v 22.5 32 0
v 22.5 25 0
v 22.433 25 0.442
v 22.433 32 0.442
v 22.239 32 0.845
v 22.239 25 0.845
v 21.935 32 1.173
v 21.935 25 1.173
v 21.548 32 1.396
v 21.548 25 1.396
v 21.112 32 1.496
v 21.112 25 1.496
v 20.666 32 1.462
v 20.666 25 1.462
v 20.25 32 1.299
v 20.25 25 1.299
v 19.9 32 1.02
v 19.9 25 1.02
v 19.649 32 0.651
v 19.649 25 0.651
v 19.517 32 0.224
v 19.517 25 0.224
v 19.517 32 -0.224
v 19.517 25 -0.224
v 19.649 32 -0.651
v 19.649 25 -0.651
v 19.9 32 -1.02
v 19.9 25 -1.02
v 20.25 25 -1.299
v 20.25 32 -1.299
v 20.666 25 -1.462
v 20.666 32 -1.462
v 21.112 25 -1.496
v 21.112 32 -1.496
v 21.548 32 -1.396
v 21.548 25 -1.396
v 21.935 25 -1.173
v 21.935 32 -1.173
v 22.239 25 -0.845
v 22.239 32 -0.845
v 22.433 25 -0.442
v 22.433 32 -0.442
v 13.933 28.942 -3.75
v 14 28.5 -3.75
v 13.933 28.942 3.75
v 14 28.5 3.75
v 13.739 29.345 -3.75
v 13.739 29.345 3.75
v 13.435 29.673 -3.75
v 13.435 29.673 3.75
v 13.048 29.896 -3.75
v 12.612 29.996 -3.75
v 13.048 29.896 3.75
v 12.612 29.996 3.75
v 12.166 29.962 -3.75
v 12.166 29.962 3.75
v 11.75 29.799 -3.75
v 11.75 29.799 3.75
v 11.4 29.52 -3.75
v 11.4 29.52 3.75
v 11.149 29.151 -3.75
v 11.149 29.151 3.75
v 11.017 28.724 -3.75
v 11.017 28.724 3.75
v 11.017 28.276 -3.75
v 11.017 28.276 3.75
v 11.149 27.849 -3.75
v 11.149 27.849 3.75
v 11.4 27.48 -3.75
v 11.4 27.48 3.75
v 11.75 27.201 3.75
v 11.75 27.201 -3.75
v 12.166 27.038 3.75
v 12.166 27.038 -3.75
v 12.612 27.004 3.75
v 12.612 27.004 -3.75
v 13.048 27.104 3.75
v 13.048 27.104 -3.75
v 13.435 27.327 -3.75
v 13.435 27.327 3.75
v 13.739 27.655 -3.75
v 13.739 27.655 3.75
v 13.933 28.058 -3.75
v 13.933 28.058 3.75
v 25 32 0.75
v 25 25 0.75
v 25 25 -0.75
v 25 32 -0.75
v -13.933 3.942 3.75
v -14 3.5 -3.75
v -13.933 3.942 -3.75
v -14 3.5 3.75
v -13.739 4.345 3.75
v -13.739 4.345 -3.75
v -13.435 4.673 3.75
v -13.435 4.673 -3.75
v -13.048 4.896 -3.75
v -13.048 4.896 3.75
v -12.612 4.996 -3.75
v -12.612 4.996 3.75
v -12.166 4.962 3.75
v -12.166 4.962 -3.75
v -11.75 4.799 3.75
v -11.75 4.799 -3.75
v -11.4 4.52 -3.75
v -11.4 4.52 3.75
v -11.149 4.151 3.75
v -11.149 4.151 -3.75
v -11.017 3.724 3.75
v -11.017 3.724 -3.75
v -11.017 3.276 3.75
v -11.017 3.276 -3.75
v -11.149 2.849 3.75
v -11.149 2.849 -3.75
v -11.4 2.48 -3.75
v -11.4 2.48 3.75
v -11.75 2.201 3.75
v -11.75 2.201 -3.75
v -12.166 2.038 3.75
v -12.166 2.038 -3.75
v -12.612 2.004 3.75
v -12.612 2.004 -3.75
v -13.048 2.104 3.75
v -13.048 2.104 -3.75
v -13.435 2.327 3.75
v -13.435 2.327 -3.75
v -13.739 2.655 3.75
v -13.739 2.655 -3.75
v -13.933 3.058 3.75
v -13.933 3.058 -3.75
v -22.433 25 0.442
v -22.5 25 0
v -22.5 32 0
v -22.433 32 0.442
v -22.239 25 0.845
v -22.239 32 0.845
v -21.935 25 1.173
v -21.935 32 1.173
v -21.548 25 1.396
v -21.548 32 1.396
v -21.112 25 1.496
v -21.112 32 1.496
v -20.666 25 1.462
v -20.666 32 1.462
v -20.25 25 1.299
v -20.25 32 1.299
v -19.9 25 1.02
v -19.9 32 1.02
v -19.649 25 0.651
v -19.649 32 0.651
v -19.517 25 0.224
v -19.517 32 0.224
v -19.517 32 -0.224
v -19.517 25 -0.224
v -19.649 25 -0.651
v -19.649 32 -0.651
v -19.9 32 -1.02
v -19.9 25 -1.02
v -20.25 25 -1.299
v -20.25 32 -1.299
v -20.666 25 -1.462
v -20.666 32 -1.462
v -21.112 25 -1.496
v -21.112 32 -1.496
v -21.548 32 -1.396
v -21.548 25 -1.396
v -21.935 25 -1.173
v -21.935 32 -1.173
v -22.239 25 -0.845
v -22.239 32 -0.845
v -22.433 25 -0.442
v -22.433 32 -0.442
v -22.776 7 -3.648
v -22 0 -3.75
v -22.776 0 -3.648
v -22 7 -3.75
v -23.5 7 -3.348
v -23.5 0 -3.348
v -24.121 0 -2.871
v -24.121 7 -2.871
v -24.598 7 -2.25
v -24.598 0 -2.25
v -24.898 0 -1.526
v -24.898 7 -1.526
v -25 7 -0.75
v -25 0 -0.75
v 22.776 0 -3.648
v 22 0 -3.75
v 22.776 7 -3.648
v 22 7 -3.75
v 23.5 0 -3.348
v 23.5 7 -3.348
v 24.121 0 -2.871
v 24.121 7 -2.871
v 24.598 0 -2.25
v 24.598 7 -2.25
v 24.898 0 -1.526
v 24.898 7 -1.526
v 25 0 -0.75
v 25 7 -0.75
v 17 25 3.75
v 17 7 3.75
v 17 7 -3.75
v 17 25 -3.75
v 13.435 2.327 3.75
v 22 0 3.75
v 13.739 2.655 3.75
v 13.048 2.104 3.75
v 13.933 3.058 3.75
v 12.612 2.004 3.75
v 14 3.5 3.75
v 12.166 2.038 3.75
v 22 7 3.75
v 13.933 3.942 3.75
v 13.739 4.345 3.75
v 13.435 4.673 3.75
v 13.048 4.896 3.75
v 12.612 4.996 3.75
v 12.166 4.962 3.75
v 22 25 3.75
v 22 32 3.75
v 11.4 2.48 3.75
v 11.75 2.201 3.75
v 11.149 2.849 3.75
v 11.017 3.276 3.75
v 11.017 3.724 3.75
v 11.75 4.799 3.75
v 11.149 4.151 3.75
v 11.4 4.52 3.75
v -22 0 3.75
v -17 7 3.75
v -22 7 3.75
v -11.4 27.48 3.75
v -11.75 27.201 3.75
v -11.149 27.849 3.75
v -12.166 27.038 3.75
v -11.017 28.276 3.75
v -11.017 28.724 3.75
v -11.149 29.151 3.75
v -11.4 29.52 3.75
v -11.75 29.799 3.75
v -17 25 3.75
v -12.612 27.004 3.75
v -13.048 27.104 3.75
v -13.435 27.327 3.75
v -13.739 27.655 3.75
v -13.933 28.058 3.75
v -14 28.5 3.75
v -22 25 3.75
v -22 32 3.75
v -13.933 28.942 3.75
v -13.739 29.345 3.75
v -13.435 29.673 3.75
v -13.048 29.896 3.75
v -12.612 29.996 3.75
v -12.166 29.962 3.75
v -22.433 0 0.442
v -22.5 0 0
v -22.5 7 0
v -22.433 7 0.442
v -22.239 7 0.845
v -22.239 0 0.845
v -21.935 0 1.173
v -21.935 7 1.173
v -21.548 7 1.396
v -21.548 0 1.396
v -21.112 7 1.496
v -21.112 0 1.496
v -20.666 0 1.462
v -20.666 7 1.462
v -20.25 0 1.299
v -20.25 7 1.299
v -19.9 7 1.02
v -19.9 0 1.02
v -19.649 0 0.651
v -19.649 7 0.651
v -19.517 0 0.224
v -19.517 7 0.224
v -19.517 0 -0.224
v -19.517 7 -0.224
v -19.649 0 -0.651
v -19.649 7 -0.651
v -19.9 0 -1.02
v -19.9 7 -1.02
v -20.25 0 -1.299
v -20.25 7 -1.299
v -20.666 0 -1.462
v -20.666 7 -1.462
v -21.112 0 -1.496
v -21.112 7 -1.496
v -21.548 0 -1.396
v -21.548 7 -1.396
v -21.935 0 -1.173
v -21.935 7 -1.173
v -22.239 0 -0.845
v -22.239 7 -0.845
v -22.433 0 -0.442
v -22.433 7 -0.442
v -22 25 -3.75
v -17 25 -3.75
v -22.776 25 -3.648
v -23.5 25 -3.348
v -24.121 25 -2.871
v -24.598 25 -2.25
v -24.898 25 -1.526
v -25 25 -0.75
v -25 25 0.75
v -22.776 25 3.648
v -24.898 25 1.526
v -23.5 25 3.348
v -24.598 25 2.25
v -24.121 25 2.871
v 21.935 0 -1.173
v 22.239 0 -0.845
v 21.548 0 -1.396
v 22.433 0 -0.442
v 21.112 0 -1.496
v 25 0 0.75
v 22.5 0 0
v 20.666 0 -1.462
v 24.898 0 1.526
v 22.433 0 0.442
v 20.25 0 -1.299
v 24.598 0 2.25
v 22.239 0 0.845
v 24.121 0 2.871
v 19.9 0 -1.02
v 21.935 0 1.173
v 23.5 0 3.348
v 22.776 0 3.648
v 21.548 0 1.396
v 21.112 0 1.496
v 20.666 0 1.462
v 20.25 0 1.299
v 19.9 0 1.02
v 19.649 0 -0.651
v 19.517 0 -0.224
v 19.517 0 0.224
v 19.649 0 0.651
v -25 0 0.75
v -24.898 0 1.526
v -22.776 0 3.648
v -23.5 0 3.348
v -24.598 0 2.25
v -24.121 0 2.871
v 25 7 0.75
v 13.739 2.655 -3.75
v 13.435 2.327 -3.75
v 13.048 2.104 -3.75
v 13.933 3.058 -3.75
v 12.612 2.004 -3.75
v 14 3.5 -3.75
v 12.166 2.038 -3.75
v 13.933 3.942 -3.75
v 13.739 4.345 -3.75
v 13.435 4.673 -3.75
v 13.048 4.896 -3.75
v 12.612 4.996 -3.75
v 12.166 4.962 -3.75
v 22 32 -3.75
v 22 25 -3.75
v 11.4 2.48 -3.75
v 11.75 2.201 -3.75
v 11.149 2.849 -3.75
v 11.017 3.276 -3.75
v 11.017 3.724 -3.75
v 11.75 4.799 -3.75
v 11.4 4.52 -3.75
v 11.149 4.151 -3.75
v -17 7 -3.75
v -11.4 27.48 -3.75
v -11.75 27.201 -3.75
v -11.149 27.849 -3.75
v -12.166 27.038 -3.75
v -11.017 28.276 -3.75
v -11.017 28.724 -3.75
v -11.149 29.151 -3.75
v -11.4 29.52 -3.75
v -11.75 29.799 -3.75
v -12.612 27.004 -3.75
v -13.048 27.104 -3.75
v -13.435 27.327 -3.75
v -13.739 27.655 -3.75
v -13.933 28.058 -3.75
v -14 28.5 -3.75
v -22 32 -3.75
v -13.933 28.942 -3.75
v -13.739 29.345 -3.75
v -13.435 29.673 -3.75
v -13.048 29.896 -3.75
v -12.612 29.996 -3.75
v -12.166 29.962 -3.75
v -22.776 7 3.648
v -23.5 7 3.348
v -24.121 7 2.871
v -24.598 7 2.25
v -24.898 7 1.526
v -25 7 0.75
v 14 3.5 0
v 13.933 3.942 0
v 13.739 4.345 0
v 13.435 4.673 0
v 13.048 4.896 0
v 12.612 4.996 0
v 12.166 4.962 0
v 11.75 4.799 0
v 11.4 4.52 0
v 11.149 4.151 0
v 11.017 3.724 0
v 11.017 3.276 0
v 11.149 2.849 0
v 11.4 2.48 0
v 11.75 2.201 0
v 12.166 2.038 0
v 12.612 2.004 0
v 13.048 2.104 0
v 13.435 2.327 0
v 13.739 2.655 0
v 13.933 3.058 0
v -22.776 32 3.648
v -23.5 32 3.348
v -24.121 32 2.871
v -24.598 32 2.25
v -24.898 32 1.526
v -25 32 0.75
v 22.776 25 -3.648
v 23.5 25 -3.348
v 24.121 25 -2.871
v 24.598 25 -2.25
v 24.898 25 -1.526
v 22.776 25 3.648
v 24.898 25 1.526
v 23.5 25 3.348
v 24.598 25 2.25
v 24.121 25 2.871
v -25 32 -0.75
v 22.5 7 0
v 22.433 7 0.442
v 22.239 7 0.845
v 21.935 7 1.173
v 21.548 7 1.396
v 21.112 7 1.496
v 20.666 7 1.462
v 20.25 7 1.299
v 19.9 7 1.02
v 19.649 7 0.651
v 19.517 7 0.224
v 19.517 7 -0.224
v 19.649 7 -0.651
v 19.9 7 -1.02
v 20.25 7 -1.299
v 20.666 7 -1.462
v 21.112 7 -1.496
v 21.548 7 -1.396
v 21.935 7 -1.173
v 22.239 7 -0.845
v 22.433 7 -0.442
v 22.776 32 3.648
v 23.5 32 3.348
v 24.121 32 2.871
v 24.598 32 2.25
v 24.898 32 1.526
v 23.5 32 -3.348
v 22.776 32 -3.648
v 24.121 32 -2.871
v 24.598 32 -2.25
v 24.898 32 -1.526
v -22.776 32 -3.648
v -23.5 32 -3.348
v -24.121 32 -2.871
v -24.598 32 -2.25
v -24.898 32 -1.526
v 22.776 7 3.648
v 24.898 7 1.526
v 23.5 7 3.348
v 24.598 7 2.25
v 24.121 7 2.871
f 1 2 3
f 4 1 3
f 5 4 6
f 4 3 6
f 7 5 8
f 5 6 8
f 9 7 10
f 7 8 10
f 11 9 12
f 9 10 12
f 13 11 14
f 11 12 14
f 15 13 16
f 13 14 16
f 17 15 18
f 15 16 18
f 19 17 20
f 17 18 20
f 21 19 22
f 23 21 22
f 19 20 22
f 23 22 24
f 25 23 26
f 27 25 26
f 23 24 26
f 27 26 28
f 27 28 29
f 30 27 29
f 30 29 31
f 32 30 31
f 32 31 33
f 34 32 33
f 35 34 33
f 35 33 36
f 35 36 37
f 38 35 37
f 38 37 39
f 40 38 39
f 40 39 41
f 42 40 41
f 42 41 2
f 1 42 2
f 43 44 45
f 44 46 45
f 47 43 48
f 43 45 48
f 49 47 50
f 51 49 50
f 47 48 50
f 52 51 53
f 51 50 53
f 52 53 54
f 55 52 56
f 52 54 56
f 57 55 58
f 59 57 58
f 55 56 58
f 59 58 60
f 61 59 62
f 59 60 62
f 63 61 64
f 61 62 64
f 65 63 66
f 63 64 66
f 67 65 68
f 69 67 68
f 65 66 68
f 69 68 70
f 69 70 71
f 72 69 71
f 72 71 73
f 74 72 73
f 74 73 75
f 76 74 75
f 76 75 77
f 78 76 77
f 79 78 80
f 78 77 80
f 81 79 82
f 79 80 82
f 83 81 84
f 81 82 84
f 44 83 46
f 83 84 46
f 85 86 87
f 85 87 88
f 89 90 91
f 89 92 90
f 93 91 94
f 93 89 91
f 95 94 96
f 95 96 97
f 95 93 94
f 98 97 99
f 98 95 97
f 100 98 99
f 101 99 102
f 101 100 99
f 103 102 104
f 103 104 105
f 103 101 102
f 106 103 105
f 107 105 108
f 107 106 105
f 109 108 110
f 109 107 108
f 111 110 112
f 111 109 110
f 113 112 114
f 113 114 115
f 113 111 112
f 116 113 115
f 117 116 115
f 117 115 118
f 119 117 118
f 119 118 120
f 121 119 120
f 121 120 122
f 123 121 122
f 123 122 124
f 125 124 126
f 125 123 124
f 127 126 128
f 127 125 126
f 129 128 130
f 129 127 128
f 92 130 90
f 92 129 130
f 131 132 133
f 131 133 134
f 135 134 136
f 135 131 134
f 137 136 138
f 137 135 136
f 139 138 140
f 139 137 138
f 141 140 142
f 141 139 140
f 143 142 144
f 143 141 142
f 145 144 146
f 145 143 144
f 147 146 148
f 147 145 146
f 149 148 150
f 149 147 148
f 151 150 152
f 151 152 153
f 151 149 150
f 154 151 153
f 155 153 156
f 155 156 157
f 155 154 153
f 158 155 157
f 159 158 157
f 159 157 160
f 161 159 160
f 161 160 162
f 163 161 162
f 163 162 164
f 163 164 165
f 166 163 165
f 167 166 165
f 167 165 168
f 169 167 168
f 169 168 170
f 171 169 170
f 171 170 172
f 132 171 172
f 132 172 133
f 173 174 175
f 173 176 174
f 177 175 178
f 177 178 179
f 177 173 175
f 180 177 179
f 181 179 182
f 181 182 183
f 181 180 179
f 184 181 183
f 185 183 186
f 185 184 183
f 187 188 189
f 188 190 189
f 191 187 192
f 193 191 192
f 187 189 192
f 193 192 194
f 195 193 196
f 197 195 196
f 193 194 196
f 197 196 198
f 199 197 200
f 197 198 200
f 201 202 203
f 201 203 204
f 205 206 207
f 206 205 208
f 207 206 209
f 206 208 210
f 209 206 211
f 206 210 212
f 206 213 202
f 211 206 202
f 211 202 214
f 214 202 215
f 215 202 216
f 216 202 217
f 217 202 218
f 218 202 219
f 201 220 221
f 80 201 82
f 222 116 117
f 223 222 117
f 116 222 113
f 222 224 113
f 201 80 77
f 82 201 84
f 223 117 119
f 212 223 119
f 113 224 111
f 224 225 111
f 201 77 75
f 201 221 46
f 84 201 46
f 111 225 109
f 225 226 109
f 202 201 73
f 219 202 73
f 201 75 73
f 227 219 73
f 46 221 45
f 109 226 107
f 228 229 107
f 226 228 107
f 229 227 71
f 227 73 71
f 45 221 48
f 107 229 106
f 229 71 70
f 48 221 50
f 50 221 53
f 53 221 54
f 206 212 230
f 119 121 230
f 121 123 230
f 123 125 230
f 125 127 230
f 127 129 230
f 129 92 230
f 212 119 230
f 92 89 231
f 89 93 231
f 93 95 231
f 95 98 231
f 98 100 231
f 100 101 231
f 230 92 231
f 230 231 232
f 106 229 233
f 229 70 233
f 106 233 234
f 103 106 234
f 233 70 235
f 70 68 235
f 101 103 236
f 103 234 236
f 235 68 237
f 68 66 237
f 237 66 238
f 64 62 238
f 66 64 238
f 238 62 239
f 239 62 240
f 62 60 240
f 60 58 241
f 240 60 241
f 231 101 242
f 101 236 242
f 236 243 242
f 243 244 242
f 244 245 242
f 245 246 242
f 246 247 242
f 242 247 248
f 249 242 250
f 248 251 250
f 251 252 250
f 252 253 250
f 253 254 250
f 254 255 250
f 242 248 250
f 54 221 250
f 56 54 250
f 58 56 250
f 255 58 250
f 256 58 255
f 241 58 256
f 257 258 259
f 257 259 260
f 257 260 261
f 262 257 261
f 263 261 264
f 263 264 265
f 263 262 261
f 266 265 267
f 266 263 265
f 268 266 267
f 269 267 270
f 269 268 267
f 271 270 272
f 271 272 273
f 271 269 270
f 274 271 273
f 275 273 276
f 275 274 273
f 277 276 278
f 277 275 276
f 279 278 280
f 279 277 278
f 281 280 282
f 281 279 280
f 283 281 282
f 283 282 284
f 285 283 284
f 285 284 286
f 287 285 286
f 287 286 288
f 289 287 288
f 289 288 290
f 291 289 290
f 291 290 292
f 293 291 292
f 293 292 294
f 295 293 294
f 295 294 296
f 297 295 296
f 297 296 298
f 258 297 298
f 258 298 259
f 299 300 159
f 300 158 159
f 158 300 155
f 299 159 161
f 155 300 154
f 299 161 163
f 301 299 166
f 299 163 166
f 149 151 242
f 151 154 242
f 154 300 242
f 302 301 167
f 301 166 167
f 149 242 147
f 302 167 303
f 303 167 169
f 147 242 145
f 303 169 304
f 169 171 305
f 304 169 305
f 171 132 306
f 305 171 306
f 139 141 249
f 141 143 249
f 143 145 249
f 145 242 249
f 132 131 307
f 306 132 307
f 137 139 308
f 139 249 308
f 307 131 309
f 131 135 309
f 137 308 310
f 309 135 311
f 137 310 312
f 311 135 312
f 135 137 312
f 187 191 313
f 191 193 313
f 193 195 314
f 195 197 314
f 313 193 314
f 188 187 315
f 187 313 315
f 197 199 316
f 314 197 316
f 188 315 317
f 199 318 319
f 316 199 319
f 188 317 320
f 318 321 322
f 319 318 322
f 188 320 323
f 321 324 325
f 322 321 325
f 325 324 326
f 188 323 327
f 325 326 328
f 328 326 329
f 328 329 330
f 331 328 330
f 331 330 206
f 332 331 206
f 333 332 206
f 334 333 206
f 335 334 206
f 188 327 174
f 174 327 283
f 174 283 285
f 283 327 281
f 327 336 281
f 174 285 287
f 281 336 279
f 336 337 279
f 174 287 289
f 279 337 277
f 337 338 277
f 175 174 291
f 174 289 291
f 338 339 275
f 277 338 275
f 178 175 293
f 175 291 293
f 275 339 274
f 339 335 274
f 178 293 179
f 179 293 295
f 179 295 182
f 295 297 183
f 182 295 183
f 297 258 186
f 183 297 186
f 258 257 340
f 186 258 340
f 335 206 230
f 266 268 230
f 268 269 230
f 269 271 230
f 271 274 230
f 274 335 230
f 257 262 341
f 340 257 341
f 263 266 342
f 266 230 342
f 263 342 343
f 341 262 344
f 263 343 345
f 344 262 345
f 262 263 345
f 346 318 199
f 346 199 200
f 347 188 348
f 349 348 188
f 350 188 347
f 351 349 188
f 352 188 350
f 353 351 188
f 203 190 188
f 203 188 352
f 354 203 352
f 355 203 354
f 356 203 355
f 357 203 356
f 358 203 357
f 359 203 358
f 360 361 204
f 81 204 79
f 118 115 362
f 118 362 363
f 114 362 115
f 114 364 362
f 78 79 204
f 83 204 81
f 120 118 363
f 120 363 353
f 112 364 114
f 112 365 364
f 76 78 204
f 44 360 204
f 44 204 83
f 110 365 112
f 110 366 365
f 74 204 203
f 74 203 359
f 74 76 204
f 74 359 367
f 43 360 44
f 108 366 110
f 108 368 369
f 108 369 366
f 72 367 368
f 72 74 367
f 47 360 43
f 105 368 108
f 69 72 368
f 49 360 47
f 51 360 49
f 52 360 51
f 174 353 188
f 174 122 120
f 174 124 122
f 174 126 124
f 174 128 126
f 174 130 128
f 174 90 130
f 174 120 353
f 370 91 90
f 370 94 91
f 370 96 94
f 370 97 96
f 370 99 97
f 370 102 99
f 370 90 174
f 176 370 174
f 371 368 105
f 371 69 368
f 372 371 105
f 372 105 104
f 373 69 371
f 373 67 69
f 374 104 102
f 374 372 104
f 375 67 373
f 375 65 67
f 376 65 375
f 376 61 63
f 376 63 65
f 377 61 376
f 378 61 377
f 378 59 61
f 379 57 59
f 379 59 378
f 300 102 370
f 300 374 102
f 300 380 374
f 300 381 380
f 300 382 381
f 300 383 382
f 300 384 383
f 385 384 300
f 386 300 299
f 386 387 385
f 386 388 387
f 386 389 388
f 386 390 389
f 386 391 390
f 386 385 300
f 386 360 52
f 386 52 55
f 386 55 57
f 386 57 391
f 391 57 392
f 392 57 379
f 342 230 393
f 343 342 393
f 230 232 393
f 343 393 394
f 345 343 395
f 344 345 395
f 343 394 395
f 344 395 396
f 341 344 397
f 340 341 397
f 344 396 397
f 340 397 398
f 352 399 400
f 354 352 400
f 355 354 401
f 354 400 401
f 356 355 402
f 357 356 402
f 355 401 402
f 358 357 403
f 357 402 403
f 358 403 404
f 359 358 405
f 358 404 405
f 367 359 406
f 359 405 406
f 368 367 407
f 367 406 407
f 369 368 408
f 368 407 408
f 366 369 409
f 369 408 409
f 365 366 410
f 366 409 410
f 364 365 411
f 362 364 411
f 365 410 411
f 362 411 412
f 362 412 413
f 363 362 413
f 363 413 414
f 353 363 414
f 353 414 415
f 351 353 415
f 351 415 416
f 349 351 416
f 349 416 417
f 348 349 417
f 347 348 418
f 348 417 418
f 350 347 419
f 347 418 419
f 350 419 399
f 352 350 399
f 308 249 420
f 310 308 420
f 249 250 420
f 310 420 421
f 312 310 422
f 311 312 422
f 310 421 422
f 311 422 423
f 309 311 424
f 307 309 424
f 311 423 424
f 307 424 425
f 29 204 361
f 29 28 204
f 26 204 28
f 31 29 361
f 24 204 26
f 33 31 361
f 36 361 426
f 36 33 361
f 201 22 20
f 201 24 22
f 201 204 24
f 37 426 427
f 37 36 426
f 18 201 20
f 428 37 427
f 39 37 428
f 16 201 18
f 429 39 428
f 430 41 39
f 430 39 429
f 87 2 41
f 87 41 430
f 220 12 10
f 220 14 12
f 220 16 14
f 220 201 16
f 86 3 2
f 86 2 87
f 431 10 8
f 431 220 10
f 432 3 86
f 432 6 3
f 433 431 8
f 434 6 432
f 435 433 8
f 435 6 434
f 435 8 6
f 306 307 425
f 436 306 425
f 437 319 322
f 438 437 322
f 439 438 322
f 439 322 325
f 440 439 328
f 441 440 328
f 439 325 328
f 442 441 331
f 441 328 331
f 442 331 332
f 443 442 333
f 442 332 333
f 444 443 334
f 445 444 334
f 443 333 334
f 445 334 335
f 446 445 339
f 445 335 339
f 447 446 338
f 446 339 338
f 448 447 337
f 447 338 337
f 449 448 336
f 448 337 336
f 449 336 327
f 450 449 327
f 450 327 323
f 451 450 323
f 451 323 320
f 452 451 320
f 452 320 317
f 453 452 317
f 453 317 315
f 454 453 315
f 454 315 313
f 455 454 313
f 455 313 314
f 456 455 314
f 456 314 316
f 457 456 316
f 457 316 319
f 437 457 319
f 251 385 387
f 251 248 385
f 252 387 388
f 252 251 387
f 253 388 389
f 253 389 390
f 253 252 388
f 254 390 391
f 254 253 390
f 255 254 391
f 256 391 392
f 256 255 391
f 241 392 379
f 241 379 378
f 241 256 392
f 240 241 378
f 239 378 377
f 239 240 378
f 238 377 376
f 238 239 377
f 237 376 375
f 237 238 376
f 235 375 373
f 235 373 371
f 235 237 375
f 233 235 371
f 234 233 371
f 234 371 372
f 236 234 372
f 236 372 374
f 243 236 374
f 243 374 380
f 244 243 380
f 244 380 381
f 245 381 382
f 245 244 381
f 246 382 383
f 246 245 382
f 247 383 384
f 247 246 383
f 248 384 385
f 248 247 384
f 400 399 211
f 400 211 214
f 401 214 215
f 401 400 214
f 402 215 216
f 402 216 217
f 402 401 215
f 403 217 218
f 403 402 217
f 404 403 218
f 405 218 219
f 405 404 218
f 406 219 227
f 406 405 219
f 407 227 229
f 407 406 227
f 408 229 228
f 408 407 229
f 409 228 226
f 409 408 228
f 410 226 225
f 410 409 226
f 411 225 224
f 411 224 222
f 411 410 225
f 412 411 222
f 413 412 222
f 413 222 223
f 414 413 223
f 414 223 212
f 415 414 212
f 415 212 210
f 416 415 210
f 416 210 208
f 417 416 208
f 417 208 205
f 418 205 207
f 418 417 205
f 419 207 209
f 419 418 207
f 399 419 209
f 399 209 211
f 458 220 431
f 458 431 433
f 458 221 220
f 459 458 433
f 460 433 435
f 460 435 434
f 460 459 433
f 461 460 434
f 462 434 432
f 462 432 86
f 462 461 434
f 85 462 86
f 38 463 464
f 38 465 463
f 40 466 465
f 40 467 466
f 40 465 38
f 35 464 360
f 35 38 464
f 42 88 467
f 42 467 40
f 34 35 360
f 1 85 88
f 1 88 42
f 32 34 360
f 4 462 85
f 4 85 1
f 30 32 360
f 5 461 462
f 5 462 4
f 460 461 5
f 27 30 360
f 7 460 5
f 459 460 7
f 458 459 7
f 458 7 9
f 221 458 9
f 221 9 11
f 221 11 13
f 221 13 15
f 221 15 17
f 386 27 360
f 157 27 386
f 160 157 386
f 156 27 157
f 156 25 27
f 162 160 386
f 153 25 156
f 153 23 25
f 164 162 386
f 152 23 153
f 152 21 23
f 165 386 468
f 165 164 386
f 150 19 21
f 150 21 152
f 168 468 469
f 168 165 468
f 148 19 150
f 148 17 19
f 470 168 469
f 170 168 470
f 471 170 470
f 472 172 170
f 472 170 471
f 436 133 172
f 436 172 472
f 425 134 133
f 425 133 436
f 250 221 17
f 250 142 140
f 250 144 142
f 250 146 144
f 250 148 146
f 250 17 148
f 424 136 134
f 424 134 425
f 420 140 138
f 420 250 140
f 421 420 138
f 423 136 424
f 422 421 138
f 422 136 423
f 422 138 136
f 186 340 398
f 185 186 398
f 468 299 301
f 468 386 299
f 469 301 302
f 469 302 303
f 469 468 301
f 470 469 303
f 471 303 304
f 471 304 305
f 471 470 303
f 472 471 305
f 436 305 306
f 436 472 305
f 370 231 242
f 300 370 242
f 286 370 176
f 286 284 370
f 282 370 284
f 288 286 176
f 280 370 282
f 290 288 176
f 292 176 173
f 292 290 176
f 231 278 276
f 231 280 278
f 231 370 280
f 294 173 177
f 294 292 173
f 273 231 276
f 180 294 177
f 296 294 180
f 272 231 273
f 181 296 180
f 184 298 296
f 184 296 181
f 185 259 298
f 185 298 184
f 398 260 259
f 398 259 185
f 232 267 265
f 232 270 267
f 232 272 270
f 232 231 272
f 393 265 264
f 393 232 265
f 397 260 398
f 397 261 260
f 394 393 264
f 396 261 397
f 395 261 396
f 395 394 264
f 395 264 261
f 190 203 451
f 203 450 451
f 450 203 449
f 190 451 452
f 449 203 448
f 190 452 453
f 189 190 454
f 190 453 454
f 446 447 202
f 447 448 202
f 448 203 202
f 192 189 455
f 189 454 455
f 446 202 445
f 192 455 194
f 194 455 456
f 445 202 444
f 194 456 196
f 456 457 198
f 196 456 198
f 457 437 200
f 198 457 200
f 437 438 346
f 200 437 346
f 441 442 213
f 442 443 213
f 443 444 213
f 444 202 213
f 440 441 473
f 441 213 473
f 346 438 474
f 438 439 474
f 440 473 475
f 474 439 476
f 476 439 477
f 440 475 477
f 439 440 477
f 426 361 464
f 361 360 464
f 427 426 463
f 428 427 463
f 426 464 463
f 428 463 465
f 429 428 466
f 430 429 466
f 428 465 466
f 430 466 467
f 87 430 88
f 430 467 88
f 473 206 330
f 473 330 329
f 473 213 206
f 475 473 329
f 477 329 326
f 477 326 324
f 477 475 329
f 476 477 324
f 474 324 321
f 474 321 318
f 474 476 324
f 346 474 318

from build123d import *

# Parameters (mm, degrees)
F0_W     = 25
F0_H     = 32
F1_DEPTH = 3.75
F2_W     = 12.2002800852
F2_H     = 18
F3_DEPTH = 3.75
F4_R     = 1.5
F5_DEPTH = 32
F6_R     = 3
F7_R     = 1.5
F8_DEPTH = 3.75


with BuildPart() as f1:
    # F0 (on Top) → F1 (new body, symmetric)
    with BuildSketch(Plane.XY):
        with Locations((12.5, 16)):
            Rectangle(F0_W, F0_H)
    extrude(amount=F1_DEPTH, both=True)

    # F2 (on Top) → F3 (cut, symmetric)
    with BuildSketch(Plane.XY):
        with Locations((23.1001400426, 16)):
            Rectangle(F2_W, F2_H)
    extrude(amount=F3_DEPTH, both=True, mode=Mode.SUBTRACT)

    # F4 (on Front) → F5 (cut)
    with BuildSketch(Plane.XZ):
        with Locations((21, 0)):
            Circle(F4_R)
    extrude(amount=-F5_DEPTH, mode=Mode.SUBTRACT)

    # F6
    f6_edges = [f1.edges().sort_by_distance(p)[0] for p in [
        (25, 28.5, -3.75),
        (25, 28.5, 3.75),
        (25, 3.5, 3.75),
        (25, 3.5, -3.75),
    ]]
    fillet(f6_edges, radius=F6_R)

    # F7 (on Top) → F8 (cut, symmetric)
    with BuildSketch(Plane.XY):
        with Locations((12.5, 3.5)):
            Circle(F7_R)
        with Locations((12.5, 28.5)):
            Circle(F7_R)
    extrude(amount=F8_DEPTH, both=True, mode=Mode.SUBTRACT)

    # F9: F1 across plane


with BuildPart() as f1_1:
    add(f1.part)
    add(f1.part.mirror(Plane.YZ))


solid = f1_1.part
